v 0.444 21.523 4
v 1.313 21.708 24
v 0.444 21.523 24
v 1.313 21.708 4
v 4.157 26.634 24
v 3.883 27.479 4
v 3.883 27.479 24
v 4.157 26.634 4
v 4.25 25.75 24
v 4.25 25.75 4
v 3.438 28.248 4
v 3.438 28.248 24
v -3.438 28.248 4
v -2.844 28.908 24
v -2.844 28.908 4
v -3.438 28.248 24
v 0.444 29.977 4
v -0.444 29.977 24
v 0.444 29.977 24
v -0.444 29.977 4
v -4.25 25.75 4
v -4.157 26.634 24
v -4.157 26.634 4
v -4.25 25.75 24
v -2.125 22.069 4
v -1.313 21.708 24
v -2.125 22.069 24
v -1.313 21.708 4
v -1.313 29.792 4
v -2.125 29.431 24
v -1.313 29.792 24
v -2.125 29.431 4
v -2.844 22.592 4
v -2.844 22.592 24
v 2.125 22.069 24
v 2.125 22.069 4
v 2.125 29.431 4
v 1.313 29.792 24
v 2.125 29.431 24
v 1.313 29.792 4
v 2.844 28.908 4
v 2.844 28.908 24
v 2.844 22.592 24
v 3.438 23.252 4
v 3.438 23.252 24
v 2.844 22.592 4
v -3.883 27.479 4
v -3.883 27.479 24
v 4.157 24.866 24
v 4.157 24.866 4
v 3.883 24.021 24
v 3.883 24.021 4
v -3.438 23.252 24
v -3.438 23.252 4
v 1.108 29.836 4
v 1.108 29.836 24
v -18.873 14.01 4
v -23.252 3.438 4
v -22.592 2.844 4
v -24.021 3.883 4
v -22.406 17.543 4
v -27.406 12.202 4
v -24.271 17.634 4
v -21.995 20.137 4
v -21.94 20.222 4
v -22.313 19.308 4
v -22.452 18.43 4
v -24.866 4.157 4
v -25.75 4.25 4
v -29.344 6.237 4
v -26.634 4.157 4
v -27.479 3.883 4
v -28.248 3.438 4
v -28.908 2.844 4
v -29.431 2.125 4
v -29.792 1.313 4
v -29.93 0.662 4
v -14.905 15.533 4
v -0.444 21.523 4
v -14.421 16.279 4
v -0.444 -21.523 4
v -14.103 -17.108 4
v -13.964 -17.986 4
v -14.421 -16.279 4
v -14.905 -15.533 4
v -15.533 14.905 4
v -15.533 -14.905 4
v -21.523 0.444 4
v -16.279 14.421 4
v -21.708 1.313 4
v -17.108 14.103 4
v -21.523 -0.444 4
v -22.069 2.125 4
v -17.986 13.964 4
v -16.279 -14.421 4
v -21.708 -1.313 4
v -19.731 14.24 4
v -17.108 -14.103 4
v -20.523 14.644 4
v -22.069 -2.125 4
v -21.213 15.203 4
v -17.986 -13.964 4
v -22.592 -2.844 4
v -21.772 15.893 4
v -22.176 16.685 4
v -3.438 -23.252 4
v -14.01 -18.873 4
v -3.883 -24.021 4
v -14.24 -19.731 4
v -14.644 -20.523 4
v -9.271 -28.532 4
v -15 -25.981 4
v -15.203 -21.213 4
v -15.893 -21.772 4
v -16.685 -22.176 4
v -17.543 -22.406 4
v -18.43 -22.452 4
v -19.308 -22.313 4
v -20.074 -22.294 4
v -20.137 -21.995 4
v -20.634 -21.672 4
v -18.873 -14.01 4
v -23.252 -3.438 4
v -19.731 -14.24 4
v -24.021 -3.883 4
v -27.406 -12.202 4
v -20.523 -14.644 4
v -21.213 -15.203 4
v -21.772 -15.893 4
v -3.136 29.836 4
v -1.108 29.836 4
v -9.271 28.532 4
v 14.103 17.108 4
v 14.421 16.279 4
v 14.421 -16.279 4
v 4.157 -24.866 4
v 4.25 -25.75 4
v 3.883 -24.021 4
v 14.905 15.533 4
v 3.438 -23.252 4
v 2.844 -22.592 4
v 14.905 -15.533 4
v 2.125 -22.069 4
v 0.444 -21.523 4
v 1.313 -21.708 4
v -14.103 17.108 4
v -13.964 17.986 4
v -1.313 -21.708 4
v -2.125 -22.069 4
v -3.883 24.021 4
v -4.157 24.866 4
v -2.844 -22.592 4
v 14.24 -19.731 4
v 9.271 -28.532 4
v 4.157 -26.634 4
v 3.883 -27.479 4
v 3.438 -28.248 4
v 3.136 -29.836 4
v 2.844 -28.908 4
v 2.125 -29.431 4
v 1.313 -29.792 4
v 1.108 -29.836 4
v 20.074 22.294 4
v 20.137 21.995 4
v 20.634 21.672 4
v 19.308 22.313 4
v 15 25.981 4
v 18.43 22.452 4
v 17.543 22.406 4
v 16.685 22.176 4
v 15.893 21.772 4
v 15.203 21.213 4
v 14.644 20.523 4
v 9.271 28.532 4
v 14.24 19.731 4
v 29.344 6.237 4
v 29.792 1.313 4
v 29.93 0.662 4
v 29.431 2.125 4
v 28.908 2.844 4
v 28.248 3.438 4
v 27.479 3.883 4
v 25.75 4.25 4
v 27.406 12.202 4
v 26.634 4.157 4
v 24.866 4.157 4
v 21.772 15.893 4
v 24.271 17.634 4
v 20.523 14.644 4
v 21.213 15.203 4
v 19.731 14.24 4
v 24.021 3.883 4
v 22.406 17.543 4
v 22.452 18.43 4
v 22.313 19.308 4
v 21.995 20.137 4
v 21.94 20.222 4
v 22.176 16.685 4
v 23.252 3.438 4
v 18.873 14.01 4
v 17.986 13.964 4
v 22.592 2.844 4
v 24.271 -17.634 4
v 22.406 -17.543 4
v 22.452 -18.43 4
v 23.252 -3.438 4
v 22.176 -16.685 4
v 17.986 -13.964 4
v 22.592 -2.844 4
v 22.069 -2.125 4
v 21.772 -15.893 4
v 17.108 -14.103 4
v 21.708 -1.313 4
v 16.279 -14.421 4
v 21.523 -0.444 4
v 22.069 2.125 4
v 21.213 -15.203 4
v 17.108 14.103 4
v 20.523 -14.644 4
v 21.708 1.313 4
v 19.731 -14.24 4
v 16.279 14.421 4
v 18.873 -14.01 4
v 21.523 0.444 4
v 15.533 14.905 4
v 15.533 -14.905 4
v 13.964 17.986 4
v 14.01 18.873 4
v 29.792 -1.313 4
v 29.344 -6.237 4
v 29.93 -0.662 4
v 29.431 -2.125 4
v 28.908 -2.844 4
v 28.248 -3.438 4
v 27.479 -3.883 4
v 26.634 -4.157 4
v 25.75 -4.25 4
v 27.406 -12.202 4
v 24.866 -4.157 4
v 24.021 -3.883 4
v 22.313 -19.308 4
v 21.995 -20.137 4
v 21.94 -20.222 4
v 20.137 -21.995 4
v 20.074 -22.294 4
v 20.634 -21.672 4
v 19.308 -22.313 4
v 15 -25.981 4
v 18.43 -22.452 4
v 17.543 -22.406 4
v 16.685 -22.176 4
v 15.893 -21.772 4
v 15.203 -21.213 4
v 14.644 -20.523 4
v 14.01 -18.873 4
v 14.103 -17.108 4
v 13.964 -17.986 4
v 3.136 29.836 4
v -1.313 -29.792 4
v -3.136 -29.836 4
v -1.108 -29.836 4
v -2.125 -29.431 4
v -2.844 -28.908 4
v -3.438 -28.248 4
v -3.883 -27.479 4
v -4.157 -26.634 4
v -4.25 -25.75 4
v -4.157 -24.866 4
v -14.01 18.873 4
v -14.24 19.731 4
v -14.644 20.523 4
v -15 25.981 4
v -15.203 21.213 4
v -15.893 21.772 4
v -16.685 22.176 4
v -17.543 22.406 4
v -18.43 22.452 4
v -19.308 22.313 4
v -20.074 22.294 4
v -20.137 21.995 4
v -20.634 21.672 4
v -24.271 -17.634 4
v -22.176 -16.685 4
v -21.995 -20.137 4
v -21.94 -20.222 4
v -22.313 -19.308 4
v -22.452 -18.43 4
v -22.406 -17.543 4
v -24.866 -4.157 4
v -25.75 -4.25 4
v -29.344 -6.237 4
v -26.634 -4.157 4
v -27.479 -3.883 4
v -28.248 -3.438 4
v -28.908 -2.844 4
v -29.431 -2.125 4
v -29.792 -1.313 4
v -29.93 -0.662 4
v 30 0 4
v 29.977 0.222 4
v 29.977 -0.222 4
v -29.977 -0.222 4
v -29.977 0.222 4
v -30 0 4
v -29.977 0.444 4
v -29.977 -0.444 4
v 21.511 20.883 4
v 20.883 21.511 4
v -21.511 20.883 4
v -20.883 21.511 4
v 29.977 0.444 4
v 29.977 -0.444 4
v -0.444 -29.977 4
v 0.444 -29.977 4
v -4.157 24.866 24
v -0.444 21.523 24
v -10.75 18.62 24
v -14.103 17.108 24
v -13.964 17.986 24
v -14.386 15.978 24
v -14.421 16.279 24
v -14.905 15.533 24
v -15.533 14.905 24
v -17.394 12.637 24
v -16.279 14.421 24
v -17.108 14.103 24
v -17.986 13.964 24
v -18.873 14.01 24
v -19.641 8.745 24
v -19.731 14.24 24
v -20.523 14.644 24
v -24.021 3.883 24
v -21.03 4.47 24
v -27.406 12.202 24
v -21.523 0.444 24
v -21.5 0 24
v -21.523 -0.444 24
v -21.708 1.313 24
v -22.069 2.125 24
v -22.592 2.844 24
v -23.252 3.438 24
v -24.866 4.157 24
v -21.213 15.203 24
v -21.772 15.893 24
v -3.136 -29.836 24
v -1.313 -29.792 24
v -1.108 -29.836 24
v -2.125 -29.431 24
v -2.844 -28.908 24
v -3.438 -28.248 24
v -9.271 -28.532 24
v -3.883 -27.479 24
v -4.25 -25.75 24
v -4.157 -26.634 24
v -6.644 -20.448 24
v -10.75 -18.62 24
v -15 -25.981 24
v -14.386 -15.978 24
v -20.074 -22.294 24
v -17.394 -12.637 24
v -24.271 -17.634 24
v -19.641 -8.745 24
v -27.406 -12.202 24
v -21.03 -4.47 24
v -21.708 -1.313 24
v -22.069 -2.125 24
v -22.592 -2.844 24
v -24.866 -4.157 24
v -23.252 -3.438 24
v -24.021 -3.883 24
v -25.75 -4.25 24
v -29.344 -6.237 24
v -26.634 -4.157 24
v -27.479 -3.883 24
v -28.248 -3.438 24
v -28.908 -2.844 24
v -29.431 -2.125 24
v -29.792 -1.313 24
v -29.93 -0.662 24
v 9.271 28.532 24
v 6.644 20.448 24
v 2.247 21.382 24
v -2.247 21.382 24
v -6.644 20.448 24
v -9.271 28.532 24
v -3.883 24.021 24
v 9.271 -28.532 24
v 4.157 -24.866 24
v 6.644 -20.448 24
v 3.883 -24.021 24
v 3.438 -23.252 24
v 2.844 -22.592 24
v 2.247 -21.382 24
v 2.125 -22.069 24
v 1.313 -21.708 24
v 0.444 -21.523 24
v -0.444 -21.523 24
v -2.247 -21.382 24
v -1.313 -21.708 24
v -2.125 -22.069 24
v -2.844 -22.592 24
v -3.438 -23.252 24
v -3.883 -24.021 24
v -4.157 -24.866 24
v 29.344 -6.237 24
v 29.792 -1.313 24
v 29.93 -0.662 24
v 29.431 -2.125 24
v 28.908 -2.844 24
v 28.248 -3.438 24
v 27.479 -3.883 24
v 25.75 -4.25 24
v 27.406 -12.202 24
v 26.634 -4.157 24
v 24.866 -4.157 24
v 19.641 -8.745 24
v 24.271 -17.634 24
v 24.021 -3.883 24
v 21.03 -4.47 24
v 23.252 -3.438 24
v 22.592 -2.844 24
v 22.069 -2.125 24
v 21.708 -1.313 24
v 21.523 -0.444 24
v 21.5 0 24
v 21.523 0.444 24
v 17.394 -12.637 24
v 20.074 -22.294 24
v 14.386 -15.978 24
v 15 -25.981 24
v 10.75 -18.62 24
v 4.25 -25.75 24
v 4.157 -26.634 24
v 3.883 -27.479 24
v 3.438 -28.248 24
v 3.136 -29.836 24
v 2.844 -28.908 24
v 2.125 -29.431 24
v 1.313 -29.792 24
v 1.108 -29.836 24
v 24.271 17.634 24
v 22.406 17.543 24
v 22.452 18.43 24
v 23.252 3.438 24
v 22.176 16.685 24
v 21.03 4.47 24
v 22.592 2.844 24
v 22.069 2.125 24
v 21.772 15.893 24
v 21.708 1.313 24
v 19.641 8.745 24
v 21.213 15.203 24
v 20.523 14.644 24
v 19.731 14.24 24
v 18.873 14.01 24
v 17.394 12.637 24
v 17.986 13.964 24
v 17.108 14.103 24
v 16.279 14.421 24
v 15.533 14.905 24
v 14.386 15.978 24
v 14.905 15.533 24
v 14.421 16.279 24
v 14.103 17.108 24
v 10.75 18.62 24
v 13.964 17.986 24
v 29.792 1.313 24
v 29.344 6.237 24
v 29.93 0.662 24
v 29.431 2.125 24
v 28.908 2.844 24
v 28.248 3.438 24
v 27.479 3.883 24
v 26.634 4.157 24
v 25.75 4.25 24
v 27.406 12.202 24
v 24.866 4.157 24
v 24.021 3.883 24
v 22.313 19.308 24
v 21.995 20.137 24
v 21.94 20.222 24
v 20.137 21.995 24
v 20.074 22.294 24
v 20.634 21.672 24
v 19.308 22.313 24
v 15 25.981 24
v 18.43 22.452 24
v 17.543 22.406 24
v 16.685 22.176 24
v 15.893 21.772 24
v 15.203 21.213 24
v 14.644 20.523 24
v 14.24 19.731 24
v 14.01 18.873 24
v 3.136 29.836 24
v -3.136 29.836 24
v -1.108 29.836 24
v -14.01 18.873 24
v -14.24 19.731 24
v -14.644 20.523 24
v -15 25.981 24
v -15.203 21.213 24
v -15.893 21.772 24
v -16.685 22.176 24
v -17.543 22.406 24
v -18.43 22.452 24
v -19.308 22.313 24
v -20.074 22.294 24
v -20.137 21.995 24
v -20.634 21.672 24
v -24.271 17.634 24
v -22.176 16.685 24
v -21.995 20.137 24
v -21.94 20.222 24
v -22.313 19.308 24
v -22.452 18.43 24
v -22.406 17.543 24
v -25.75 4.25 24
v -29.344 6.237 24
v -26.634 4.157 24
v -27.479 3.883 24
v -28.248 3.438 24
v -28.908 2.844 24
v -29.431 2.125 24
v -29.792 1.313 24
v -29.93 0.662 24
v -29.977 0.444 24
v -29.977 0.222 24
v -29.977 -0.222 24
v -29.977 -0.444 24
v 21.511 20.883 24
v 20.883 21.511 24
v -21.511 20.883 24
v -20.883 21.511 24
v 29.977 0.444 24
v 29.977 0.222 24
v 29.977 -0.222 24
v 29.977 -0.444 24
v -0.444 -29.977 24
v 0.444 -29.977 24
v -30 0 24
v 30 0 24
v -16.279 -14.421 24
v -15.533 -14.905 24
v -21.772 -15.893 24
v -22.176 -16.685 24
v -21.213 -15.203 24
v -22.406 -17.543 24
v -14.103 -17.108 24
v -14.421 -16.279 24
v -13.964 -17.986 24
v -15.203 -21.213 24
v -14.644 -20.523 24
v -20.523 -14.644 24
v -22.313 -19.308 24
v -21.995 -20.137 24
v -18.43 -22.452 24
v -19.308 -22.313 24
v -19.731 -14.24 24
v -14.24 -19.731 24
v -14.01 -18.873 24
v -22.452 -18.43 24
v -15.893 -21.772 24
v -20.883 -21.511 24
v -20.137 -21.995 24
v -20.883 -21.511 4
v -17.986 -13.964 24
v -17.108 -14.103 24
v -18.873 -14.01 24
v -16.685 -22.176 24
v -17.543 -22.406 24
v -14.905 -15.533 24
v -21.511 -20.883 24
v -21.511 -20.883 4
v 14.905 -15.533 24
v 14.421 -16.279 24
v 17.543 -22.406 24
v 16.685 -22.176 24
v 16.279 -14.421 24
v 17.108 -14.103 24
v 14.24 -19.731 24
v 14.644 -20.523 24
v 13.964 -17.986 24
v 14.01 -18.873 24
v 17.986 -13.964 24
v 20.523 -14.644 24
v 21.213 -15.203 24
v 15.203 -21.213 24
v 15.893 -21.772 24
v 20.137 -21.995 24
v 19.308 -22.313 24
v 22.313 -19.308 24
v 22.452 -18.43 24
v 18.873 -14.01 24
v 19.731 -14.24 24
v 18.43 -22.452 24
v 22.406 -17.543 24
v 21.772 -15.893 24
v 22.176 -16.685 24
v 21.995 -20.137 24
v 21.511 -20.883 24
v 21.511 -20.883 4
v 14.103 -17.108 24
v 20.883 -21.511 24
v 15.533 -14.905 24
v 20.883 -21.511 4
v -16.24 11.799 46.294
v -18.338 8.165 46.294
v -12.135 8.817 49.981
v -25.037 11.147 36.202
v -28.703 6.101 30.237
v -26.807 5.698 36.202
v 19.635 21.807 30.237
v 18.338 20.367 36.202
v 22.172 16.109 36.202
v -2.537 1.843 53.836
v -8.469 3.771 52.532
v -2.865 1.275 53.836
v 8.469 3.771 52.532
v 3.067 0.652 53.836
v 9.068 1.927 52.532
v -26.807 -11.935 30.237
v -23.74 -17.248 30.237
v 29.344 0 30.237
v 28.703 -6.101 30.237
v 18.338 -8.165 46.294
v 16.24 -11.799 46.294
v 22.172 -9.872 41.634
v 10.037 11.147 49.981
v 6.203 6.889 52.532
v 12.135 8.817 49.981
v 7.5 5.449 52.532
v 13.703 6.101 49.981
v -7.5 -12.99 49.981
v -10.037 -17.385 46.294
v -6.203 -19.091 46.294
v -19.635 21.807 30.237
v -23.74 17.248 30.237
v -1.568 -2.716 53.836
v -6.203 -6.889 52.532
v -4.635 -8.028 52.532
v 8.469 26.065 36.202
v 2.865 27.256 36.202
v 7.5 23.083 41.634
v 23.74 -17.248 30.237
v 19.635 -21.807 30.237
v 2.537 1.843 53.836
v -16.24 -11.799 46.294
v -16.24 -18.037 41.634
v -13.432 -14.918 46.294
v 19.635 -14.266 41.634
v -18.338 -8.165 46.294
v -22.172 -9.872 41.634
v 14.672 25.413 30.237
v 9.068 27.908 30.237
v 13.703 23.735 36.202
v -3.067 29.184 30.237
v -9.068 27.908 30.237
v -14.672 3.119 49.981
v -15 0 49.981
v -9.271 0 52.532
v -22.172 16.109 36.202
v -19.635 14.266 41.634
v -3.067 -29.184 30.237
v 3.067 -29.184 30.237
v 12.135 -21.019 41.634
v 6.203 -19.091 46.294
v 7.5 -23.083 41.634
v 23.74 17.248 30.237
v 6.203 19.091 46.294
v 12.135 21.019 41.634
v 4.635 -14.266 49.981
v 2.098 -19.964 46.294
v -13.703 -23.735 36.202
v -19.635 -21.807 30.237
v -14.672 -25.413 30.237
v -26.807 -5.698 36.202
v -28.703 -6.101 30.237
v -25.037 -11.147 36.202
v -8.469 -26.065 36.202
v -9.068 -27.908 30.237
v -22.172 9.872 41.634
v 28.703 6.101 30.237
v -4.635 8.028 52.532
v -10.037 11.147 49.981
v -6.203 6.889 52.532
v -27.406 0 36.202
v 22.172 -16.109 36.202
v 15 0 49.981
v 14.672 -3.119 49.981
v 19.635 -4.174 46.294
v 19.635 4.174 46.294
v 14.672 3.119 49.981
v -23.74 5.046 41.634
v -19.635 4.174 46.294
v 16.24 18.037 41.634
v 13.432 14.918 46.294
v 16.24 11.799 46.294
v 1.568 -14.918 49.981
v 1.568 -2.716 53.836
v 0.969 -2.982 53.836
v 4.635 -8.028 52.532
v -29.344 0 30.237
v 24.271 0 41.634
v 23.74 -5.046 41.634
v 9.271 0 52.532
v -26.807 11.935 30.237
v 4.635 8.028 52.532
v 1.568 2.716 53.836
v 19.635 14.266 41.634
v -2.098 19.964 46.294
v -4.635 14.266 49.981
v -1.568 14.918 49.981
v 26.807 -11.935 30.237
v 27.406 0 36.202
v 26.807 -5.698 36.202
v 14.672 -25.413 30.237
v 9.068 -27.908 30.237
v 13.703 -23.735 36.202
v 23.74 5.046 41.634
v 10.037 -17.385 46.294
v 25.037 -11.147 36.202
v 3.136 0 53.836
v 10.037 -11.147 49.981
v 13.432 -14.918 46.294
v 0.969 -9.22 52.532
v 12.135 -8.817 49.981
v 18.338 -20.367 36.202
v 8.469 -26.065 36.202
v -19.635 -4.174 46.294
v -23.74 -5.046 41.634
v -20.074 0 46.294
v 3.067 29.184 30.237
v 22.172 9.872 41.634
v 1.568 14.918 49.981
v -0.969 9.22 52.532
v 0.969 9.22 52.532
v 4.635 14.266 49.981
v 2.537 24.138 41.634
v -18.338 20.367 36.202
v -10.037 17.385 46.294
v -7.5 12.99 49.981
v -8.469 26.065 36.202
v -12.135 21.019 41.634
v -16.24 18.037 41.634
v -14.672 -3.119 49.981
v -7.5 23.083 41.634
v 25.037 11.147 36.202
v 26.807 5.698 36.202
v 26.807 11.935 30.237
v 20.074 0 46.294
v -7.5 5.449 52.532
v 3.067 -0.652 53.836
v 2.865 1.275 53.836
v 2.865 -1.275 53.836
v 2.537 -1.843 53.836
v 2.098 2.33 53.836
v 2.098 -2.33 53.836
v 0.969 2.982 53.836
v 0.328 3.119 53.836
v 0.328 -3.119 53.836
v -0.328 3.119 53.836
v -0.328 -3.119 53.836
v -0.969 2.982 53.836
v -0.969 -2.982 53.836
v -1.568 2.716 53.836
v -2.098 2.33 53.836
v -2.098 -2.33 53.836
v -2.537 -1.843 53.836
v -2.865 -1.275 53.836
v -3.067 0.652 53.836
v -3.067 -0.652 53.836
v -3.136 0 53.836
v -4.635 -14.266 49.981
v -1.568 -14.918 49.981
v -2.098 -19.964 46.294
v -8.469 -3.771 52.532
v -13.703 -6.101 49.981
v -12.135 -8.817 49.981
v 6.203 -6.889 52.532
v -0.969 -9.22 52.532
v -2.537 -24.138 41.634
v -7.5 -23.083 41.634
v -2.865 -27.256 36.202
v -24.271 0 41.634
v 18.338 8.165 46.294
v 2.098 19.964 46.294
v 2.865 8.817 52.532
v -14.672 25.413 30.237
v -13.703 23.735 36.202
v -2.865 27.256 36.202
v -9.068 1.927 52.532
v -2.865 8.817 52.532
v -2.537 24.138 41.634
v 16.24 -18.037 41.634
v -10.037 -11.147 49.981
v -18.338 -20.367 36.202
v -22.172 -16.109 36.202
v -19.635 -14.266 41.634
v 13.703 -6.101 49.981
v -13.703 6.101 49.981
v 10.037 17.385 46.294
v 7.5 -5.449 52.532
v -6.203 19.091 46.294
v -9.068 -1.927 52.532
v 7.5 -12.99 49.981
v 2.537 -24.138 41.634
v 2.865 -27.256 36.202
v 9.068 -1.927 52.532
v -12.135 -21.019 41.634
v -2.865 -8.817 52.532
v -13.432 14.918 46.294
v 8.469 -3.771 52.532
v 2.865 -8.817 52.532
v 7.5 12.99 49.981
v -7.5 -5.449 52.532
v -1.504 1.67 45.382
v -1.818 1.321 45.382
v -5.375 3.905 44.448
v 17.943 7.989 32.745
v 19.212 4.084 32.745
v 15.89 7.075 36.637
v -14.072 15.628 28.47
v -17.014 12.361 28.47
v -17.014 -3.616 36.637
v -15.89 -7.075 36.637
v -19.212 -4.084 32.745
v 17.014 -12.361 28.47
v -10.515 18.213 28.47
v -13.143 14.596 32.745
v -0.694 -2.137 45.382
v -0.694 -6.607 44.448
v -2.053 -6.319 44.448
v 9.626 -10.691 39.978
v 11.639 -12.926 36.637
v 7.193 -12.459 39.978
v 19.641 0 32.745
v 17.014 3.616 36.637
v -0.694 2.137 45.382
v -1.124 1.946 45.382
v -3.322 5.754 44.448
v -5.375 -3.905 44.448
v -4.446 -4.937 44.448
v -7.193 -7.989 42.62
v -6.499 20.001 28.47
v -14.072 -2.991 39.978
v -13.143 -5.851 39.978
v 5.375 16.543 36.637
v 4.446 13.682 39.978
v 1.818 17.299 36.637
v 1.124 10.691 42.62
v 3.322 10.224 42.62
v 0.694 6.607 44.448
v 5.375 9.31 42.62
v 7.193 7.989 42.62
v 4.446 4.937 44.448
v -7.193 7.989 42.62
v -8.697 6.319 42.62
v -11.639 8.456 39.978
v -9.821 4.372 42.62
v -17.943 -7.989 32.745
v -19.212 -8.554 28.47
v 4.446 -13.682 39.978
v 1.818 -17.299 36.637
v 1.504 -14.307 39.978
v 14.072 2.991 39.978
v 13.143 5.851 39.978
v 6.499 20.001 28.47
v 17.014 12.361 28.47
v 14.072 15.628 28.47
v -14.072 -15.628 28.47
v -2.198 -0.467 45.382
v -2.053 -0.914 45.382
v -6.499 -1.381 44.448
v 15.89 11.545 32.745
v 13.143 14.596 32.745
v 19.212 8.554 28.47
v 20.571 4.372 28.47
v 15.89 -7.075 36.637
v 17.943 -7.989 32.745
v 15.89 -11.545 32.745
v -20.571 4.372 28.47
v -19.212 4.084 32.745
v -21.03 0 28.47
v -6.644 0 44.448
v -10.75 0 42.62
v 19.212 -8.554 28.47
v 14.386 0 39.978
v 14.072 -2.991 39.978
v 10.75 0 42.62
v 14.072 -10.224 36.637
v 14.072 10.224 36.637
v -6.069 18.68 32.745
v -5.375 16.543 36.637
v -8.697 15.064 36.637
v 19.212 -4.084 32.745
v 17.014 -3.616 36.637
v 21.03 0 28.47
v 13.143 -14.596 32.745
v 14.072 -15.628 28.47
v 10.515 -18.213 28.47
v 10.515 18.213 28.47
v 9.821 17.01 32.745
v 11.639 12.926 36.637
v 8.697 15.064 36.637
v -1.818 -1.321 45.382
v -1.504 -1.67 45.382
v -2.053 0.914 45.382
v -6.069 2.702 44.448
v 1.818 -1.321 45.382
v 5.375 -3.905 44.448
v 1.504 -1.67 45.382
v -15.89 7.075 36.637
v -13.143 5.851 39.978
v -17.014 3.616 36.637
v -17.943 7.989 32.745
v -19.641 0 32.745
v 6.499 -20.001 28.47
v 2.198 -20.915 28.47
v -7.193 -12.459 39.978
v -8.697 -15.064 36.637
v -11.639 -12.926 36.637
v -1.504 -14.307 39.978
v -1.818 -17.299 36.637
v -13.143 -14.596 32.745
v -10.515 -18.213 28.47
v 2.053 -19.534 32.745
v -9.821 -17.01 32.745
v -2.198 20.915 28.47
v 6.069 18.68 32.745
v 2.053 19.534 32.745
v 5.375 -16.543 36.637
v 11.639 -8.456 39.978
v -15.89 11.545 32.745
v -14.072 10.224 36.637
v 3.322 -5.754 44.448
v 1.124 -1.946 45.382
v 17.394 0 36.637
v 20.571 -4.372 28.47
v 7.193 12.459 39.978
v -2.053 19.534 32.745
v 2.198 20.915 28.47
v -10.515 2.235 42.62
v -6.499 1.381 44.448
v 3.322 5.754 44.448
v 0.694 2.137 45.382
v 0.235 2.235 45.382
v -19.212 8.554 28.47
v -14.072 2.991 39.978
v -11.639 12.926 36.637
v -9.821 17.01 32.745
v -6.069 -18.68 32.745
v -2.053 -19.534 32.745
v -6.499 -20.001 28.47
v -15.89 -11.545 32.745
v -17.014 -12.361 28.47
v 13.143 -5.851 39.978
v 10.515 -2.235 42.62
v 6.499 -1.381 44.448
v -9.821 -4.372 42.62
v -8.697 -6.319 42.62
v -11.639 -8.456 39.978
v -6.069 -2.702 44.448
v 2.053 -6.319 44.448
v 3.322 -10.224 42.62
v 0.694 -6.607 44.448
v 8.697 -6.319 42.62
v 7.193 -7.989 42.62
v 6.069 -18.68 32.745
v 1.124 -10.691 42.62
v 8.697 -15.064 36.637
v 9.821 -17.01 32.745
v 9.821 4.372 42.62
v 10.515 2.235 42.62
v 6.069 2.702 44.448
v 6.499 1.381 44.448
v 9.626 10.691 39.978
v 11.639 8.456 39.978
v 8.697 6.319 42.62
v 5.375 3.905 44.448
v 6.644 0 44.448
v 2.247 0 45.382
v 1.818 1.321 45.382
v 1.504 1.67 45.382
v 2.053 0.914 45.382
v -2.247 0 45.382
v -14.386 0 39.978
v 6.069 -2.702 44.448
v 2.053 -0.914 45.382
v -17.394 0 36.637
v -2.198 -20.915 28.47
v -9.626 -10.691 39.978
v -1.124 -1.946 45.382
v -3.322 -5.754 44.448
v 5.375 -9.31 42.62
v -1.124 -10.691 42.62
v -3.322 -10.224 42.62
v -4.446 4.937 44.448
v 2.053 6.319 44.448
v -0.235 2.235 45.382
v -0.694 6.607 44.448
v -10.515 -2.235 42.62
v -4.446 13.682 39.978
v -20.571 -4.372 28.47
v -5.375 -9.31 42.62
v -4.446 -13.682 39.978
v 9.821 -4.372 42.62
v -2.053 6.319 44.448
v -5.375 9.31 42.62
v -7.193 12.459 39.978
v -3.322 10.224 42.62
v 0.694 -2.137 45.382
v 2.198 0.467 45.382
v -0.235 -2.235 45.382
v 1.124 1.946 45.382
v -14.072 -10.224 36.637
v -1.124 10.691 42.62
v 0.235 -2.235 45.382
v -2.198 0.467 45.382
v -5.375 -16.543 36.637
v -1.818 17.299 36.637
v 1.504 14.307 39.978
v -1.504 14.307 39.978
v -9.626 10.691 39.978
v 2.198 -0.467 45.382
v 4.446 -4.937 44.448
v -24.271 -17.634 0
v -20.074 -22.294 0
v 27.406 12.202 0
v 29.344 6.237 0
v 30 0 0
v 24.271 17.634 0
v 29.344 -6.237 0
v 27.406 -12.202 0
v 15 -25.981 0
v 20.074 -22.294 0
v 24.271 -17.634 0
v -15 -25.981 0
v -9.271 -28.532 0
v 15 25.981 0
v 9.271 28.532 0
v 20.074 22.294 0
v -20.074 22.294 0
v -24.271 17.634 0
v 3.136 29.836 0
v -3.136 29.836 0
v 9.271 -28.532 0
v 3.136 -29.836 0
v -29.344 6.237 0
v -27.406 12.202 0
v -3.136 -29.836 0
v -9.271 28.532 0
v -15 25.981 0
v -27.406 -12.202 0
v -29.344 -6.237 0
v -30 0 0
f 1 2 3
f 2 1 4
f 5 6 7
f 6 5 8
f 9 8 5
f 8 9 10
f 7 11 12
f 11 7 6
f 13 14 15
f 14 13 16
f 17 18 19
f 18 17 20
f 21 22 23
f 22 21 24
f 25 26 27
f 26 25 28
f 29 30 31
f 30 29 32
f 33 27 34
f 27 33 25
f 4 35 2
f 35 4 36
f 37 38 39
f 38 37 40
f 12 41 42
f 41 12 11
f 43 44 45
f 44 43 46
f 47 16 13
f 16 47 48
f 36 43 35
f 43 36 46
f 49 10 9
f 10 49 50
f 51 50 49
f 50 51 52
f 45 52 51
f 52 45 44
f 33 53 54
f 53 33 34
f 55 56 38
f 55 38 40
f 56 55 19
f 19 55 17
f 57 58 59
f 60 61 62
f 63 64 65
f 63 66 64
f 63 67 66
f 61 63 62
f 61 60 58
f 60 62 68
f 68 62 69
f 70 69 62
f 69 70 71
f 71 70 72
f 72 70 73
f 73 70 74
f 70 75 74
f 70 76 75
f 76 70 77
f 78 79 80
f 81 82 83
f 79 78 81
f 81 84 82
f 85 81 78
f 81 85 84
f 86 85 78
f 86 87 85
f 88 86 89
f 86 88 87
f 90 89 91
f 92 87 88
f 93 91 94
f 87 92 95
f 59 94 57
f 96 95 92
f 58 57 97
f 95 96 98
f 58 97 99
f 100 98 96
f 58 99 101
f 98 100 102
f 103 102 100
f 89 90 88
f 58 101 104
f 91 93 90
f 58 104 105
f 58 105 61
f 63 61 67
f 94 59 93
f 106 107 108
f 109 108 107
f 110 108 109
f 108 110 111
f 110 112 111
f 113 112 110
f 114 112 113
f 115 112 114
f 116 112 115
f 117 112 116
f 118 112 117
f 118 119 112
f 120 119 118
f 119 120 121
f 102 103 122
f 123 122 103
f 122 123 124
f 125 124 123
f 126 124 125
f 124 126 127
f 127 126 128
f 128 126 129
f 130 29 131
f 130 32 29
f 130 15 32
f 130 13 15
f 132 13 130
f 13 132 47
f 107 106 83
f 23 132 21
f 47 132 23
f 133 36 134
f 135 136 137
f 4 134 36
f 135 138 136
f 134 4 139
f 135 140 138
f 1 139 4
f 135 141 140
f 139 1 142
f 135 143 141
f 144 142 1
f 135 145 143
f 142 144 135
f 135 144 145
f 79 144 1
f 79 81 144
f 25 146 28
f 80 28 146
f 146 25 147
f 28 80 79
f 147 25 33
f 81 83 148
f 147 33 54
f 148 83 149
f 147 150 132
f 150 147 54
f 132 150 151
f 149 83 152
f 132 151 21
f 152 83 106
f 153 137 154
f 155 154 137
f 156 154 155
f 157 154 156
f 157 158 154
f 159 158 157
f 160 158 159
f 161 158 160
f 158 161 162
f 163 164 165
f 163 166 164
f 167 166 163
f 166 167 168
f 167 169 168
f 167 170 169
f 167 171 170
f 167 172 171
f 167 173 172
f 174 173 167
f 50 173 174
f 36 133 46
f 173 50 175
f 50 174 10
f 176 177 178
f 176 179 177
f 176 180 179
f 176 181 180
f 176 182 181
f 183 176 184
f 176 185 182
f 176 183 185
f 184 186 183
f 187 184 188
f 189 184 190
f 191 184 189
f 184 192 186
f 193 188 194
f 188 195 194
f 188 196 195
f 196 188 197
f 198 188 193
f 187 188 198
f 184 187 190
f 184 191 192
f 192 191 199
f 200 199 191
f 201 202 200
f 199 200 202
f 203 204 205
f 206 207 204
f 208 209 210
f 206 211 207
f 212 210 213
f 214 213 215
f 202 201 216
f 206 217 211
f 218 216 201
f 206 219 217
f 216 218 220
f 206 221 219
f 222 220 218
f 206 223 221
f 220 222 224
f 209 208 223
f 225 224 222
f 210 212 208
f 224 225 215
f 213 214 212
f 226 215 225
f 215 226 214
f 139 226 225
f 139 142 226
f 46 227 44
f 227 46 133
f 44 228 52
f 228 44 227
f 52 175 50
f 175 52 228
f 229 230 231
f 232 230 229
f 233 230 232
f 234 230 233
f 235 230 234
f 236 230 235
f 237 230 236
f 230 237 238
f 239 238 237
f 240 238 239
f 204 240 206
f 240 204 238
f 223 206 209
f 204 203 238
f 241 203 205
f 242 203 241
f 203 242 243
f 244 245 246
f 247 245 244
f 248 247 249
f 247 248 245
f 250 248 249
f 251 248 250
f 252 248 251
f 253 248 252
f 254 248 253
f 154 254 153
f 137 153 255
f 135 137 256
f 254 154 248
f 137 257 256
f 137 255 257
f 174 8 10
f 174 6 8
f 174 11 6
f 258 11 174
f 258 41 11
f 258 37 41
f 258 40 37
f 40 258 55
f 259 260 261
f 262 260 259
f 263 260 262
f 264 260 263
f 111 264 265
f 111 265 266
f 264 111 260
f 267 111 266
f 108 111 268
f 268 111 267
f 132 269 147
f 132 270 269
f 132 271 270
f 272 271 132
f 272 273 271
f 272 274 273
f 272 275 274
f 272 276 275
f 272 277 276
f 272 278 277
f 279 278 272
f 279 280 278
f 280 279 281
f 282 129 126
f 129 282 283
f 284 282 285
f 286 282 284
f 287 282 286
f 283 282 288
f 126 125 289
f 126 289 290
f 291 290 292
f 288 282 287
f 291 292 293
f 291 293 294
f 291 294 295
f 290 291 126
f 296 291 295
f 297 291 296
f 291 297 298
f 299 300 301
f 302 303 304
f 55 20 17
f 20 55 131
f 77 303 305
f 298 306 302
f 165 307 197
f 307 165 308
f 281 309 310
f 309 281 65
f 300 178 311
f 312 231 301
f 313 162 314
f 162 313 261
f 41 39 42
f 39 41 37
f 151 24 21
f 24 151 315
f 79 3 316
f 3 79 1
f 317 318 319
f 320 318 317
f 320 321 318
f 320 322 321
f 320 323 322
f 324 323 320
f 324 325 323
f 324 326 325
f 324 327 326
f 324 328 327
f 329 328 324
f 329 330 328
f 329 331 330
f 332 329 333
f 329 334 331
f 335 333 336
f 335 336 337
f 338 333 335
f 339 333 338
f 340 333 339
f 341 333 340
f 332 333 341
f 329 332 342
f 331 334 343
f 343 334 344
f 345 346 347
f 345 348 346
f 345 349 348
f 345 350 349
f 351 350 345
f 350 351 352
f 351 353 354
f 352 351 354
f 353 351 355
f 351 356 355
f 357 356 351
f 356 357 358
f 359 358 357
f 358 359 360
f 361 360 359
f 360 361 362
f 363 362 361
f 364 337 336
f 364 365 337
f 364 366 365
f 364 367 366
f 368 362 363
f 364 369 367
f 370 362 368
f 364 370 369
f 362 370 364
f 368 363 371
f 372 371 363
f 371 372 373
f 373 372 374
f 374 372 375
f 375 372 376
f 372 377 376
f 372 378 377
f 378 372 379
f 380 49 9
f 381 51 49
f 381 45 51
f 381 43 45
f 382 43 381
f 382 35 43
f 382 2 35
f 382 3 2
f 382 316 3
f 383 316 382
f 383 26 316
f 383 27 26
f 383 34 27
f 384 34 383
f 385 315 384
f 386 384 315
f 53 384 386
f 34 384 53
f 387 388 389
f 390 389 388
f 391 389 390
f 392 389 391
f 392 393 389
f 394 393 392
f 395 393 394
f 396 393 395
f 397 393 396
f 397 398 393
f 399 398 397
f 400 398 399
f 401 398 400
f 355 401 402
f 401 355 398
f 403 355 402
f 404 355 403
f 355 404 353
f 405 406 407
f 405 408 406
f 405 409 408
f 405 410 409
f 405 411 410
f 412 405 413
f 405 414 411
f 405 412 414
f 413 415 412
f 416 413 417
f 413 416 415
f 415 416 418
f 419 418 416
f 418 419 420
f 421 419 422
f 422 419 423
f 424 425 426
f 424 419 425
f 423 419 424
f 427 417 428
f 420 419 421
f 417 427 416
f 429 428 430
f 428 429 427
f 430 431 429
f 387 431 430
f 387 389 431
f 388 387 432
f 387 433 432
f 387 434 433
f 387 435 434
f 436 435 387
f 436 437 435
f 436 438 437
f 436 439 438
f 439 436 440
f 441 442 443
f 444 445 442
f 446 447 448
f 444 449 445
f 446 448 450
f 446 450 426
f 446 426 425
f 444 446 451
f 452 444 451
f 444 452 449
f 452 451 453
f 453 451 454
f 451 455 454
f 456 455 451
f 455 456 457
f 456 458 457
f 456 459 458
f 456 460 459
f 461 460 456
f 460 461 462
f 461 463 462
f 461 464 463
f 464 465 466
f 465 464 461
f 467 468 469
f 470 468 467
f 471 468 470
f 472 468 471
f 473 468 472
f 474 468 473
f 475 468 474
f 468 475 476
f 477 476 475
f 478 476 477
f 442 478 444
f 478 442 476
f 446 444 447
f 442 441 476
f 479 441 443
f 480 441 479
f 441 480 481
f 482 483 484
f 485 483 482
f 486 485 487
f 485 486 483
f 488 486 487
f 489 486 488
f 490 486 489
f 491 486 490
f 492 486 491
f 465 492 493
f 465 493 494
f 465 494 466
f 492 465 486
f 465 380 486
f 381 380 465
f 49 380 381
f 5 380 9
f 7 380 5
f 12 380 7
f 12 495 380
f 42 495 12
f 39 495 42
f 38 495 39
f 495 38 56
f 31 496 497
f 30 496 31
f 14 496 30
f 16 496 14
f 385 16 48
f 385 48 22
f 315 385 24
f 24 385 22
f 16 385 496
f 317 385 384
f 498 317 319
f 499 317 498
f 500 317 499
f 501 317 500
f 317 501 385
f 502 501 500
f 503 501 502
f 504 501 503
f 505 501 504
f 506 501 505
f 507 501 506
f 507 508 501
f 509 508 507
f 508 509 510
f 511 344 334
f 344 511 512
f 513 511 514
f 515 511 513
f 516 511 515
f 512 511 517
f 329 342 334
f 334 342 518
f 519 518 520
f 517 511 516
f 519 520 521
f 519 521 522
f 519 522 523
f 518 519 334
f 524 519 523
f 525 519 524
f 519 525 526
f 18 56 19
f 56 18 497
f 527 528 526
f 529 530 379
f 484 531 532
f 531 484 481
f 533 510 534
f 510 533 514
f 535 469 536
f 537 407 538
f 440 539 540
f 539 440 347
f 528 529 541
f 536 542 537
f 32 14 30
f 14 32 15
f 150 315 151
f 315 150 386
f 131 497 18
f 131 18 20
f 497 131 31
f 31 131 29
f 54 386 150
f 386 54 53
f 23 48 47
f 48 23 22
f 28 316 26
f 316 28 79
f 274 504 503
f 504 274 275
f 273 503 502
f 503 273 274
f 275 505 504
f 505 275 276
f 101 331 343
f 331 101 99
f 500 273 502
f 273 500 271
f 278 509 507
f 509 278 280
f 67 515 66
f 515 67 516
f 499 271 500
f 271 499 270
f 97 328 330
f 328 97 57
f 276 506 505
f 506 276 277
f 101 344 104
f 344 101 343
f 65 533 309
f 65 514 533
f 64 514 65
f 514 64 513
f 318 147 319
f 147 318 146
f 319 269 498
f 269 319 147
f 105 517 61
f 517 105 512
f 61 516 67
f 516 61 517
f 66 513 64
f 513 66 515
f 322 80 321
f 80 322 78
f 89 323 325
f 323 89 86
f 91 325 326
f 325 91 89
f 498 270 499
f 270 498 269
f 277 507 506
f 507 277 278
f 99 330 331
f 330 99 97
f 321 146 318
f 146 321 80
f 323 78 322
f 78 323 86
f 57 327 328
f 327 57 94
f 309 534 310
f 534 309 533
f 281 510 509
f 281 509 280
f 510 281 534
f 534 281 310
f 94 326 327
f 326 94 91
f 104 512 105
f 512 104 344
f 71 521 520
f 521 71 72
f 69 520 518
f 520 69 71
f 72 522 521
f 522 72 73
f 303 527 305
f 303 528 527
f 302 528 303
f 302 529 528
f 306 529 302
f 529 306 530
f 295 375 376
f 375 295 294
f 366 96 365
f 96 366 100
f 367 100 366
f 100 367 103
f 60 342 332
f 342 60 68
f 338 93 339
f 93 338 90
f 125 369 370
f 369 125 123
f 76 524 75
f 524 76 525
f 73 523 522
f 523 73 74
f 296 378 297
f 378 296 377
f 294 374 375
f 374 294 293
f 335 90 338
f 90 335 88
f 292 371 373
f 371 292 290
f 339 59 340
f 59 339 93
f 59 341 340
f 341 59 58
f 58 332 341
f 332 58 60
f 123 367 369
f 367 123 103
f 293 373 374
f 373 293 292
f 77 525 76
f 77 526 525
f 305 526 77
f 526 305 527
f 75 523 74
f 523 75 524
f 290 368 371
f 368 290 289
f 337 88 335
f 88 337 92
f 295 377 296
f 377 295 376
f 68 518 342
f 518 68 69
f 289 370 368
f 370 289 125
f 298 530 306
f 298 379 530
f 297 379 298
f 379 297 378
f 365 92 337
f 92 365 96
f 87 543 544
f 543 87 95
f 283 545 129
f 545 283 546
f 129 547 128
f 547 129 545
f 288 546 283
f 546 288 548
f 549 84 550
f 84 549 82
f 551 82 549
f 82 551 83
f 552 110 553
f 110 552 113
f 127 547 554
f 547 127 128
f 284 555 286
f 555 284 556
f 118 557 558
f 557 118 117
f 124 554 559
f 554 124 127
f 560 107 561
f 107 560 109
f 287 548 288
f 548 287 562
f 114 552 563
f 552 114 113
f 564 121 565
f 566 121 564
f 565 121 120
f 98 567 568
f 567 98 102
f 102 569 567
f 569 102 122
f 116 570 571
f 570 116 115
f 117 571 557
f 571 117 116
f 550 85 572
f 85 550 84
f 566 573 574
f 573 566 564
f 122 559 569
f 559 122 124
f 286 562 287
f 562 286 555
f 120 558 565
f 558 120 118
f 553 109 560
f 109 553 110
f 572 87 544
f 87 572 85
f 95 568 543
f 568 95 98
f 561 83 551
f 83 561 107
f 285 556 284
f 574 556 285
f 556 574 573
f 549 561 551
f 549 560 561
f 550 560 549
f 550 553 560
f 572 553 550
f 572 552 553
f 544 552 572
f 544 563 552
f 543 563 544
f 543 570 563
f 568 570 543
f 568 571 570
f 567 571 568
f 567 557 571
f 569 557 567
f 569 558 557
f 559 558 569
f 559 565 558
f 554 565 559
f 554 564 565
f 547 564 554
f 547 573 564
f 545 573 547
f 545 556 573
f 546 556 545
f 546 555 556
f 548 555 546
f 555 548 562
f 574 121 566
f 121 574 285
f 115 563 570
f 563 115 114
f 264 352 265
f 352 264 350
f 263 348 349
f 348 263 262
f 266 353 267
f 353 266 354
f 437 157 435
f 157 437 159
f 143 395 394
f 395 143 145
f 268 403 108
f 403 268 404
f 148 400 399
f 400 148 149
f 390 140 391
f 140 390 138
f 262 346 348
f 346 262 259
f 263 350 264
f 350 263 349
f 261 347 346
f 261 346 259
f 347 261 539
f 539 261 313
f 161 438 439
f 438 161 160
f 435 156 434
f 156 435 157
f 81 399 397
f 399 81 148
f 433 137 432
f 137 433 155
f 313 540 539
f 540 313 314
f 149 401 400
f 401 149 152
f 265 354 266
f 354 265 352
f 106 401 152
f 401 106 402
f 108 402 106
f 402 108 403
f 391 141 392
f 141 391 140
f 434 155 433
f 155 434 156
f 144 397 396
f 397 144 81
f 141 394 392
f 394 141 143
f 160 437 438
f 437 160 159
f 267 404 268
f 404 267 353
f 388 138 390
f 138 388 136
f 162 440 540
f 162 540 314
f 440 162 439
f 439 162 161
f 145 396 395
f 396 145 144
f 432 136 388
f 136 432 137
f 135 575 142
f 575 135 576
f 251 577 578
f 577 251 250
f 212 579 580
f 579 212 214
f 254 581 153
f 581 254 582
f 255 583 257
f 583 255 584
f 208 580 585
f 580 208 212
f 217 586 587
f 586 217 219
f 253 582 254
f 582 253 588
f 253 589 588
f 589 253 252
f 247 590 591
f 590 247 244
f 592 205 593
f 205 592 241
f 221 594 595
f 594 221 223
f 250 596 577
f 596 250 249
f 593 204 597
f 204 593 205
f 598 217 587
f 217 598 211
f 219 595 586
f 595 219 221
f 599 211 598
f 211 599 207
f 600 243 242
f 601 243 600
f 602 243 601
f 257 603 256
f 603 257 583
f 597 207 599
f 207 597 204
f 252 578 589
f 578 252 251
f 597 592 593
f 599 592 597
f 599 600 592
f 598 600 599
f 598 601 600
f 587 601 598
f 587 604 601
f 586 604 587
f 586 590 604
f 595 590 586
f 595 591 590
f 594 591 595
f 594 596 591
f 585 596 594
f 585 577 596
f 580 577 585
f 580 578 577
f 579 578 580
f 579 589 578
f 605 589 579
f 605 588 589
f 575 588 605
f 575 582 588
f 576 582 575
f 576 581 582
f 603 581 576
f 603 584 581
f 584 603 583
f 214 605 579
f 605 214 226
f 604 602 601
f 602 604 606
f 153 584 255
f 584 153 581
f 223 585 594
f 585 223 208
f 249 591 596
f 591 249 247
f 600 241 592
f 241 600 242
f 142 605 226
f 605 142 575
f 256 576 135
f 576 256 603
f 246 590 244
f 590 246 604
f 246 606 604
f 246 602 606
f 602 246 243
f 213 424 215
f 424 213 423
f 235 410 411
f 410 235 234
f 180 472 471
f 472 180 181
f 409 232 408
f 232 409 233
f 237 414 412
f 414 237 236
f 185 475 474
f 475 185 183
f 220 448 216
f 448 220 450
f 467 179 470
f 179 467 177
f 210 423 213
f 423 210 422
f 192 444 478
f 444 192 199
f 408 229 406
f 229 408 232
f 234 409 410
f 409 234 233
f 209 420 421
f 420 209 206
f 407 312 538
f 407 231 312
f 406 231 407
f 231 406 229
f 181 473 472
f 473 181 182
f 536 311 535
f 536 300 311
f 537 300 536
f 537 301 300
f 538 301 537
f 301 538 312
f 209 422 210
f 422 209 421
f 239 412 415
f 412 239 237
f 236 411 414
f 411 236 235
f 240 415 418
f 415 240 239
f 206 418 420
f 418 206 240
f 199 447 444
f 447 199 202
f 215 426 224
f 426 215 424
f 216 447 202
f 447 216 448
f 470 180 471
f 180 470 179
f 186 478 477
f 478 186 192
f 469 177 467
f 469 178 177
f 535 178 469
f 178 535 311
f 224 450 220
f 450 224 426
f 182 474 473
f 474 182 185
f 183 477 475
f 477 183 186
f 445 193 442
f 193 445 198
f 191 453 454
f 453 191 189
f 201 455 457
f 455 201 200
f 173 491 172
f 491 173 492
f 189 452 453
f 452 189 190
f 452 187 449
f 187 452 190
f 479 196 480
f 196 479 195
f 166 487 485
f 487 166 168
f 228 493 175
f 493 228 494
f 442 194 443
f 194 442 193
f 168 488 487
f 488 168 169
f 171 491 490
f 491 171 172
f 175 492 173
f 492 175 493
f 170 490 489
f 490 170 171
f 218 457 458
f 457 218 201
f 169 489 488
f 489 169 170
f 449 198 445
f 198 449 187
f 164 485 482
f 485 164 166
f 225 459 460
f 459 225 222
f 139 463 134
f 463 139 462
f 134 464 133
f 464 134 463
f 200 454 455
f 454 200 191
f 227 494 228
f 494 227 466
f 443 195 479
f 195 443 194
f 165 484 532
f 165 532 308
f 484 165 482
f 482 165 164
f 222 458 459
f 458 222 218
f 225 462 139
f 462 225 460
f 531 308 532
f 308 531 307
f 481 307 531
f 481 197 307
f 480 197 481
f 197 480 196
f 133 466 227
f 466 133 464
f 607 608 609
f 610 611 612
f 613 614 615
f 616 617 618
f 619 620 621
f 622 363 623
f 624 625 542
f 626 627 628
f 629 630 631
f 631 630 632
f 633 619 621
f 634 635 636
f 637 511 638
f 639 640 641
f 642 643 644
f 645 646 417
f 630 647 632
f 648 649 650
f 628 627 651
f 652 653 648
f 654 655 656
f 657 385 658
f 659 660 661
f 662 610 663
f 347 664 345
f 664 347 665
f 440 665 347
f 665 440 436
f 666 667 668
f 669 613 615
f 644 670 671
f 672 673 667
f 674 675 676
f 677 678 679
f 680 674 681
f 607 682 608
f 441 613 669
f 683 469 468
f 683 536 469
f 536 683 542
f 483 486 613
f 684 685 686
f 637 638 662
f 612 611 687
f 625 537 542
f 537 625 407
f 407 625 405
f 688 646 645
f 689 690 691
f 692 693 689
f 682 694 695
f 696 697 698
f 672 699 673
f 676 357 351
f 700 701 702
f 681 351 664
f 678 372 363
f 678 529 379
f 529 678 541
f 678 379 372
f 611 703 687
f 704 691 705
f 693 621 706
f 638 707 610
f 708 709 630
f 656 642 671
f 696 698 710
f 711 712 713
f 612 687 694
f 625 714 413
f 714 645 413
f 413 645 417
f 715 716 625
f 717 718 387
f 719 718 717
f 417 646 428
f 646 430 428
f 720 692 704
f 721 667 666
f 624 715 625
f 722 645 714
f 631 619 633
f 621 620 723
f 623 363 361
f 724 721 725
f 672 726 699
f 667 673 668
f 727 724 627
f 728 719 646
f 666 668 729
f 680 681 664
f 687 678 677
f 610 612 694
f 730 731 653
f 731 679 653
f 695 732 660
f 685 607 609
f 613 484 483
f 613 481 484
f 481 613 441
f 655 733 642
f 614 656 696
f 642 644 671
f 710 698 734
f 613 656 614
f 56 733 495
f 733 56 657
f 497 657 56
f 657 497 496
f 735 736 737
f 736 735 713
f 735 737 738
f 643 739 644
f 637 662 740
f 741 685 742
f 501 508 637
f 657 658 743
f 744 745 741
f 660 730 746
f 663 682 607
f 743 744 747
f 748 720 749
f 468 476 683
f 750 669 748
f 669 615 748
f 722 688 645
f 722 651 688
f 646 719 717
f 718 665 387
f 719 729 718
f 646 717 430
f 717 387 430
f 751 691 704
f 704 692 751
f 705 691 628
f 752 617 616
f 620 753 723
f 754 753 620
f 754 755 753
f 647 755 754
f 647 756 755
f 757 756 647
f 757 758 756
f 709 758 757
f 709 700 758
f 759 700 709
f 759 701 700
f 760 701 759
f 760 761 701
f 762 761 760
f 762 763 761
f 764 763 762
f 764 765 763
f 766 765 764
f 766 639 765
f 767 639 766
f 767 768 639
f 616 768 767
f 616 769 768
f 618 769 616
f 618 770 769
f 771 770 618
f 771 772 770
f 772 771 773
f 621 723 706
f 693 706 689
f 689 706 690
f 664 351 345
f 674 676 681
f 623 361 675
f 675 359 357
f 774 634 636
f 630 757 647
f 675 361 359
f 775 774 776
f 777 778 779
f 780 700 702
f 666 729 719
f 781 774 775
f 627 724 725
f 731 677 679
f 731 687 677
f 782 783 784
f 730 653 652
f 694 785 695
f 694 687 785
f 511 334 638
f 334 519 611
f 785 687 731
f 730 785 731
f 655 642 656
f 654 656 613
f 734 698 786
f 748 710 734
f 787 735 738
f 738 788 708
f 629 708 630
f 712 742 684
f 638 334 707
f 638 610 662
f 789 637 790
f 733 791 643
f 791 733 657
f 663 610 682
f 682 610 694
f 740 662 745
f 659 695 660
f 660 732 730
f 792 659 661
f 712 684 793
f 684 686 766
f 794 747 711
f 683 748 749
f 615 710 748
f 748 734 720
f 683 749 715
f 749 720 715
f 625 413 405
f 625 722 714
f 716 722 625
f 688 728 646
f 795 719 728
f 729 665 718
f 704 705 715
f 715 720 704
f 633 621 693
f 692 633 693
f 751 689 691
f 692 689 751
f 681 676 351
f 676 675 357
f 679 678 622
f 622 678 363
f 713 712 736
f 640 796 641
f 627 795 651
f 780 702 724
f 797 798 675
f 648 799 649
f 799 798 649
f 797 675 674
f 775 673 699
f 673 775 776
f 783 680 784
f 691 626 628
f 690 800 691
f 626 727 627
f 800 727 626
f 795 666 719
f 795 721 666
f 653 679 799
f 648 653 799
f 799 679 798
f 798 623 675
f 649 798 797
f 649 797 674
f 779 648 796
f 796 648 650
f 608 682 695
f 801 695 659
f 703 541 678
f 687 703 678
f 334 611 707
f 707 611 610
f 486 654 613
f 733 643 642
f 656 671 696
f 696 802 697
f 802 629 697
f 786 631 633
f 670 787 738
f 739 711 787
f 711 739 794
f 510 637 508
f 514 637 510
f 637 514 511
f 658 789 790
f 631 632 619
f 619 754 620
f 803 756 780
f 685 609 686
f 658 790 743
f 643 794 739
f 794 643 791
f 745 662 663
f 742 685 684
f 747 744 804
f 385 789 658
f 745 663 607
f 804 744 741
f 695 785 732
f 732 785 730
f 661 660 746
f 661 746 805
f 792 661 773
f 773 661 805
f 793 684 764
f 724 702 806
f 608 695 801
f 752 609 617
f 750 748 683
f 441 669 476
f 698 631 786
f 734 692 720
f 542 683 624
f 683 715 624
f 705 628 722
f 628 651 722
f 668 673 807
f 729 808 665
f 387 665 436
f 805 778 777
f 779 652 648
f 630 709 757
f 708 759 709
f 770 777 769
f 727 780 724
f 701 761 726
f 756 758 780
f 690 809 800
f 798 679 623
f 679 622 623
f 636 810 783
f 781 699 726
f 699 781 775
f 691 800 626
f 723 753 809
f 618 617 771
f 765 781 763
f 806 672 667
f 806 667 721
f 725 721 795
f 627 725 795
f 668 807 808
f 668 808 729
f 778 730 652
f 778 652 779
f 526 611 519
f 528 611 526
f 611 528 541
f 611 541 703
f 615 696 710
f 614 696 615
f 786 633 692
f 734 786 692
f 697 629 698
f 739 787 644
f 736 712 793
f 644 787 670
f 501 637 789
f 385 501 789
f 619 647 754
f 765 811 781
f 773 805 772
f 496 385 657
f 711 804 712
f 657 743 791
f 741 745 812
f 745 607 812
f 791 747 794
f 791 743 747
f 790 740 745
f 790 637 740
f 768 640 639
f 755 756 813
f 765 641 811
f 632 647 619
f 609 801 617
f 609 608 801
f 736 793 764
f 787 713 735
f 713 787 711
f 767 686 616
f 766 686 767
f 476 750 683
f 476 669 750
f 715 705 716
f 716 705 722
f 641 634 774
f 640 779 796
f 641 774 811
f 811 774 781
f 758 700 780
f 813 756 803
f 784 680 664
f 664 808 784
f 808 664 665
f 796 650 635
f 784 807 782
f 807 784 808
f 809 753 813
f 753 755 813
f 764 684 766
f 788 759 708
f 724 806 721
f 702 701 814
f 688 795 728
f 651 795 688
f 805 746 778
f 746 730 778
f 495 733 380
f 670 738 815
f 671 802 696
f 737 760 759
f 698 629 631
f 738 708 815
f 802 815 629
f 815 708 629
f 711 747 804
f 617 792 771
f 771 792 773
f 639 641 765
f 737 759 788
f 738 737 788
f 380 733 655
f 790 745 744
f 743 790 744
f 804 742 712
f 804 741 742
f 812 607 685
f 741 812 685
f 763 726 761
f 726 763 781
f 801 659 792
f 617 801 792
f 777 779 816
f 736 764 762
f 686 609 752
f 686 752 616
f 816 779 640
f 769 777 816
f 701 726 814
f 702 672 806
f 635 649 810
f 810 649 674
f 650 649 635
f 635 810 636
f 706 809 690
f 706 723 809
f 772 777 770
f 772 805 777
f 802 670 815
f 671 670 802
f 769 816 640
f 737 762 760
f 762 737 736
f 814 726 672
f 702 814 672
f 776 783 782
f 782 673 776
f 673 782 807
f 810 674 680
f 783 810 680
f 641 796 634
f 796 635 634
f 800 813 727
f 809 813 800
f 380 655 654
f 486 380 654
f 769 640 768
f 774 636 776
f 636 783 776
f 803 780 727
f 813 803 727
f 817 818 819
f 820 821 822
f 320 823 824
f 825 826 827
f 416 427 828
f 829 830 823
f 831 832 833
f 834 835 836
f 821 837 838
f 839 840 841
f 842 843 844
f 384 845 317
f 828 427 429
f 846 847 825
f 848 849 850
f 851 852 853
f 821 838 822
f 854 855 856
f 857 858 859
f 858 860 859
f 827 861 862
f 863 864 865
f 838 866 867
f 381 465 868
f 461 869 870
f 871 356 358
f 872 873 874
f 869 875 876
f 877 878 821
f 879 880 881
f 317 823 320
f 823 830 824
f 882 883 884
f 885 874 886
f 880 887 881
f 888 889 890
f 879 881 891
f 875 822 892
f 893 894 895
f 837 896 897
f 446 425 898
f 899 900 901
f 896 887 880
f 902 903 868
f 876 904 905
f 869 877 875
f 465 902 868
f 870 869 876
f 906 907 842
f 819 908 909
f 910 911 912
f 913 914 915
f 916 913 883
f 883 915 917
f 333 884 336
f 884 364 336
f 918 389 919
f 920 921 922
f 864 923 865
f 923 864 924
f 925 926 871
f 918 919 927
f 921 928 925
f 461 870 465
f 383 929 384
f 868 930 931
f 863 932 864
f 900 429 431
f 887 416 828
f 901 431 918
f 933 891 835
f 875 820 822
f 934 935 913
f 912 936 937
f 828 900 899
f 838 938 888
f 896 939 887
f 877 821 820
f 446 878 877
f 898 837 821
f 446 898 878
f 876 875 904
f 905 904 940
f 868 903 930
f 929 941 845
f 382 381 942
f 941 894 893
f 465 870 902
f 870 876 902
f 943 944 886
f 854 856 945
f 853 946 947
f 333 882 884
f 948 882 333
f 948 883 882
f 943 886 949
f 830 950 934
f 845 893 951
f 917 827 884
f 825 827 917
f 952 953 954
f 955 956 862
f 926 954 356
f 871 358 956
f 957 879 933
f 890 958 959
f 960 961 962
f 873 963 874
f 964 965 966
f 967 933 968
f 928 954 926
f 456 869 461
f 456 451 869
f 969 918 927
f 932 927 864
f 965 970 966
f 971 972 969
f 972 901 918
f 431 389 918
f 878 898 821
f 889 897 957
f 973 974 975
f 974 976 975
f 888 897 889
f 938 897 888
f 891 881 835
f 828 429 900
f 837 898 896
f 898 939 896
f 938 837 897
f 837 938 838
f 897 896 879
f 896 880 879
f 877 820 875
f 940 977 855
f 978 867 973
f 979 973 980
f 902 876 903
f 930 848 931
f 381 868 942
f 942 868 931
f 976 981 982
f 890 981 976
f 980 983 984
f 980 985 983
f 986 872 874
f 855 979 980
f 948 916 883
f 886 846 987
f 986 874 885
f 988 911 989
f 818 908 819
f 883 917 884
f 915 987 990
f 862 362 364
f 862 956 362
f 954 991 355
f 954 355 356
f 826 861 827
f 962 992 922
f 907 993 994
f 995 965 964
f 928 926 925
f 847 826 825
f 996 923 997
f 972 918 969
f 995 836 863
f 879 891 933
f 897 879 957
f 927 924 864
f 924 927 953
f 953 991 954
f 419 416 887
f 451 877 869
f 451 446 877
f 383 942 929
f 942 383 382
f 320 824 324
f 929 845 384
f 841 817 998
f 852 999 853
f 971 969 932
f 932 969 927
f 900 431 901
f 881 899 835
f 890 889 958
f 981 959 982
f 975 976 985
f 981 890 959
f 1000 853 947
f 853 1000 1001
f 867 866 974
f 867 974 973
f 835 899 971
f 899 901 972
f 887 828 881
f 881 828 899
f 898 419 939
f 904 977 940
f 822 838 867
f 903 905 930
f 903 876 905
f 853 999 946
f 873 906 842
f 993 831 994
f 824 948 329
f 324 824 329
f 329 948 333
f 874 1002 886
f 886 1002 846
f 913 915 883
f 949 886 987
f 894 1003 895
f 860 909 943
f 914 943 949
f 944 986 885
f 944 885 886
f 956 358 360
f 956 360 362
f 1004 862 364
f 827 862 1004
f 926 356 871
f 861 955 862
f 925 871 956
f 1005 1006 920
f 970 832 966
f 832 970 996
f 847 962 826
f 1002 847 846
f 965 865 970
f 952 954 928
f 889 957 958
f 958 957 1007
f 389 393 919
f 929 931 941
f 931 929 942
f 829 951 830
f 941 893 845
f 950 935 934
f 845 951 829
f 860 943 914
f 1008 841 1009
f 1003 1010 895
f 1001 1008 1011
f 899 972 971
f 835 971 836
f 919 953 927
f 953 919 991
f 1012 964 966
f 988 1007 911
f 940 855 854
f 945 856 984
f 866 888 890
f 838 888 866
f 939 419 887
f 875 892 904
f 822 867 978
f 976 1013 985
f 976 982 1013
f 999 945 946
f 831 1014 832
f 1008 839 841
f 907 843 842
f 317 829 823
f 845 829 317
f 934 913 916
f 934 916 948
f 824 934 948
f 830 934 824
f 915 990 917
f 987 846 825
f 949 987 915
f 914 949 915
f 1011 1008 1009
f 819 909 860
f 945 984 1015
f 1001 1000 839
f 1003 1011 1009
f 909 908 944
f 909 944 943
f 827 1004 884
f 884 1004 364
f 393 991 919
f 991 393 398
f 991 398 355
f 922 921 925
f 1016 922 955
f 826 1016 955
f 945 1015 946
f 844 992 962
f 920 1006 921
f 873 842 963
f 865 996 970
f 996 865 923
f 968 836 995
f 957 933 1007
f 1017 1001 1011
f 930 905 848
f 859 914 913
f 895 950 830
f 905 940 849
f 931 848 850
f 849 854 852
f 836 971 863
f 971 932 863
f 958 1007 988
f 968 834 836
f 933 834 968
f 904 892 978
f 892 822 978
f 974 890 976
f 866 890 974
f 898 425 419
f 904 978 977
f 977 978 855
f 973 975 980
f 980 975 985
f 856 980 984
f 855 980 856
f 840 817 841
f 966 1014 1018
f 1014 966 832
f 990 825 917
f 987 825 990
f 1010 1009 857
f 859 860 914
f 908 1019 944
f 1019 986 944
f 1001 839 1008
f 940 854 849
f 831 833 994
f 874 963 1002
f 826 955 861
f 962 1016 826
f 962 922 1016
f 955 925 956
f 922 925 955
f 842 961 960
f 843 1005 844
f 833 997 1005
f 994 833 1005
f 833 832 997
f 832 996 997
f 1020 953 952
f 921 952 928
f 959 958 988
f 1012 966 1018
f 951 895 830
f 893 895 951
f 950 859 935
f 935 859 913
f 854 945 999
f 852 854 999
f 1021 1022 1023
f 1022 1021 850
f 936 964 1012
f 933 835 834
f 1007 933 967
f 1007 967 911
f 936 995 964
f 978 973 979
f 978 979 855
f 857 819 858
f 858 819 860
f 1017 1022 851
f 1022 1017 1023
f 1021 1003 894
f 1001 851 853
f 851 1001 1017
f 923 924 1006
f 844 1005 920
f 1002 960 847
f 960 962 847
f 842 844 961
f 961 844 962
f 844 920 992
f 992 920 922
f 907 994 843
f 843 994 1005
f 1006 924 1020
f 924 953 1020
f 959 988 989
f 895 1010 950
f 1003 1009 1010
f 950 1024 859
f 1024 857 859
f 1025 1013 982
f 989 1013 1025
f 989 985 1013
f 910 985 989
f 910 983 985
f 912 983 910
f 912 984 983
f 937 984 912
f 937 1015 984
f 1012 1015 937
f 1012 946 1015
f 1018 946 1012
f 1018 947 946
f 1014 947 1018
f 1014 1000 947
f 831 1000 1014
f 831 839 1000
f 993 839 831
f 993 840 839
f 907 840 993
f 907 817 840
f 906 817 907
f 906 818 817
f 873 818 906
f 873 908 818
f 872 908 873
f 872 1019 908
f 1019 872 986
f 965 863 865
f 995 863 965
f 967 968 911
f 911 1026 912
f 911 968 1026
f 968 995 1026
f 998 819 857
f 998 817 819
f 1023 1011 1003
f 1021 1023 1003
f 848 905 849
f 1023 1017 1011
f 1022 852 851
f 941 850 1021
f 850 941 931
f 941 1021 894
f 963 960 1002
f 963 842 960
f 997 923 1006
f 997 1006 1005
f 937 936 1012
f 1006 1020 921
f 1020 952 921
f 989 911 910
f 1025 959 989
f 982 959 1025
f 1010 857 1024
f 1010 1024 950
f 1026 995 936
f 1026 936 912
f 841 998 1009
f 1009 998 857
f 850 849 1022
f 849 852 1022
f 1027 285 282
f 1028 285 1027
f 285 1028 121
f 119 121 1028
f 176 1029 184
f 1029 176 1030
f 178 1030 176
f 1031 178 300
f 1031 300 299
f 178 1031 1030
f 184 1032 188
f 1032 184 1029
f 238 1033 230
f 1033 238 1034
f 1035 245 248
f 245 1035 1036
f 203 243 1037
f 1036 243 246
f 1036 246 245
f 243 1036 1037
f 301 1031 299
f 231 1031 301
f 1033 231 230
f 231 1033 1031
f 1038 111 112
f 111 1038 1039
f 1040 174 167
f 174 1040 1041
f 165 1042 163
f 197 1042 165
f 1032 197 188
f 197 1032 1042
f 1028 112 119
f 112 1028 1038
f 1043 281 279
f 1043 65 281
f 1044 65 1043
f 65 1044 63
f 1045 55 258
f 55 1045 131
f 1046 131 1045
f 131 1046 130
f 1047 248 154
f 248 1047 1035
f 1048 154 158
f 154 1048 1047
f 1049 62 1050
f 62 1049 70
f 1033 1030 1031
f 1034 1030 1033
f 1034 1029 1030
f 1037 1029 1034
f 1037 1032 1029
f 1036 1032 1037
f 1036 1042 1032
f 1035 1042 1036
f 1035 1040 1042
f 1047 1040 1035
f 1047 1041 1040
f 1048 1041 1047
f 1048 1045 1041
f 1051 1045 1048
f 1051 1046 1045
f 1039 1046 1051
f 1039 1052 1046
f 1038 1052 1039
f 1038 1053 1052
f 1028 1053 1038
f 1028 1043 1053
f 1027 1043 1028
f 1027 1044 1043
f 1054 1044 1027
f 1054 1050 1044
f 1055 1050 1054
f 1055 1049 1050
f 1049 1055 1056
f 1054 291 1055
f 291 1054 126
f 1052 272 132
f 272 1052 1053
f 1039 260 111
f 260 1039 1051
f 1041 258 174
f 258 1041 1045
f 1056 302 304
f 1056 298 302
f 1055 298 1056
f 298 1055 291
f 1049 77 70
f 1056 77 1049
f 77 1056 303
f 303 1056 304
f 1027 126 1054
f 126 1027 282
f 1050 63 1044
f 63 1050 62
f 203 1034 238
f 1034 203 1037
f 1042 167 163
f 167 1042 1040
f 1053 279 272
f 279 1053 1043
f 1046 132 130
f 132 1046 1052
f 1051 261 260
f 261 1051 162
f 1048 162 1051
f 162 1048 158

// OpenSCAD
diameter=60; //[5:100]
hight=20;	//[0:100]
column_number=8; //[0:36]

$fn=30; 

base_hight=2+hight/10;
column_diameter=1+diameter/8;
radius=diameter/2;

translate([0,0,base_hight/2])
cylinder(h=base_hight, r=radius, center=true);

column_z=base_hight+hight/2;

for ( i = [0 : column_number-1] )
{
    rotate( i * 360 / column_number, [0, 0, 1])
    translate([0, (diameter-column_diameter)/2, base_hight+hight/2])
  		cylinder(h=hight, r=column_diameter/2, center=true);
}

cupola();


module cupola()
{
	translate([0,0,base_hight+hight])
	difference()
	{
	
		sphere(r=radius, center=true);
		sphere(r=radius-column_diameter, center=true);
		translate([0,0,-diameter/2])
		cube(diameter, center=true);
	}

}
